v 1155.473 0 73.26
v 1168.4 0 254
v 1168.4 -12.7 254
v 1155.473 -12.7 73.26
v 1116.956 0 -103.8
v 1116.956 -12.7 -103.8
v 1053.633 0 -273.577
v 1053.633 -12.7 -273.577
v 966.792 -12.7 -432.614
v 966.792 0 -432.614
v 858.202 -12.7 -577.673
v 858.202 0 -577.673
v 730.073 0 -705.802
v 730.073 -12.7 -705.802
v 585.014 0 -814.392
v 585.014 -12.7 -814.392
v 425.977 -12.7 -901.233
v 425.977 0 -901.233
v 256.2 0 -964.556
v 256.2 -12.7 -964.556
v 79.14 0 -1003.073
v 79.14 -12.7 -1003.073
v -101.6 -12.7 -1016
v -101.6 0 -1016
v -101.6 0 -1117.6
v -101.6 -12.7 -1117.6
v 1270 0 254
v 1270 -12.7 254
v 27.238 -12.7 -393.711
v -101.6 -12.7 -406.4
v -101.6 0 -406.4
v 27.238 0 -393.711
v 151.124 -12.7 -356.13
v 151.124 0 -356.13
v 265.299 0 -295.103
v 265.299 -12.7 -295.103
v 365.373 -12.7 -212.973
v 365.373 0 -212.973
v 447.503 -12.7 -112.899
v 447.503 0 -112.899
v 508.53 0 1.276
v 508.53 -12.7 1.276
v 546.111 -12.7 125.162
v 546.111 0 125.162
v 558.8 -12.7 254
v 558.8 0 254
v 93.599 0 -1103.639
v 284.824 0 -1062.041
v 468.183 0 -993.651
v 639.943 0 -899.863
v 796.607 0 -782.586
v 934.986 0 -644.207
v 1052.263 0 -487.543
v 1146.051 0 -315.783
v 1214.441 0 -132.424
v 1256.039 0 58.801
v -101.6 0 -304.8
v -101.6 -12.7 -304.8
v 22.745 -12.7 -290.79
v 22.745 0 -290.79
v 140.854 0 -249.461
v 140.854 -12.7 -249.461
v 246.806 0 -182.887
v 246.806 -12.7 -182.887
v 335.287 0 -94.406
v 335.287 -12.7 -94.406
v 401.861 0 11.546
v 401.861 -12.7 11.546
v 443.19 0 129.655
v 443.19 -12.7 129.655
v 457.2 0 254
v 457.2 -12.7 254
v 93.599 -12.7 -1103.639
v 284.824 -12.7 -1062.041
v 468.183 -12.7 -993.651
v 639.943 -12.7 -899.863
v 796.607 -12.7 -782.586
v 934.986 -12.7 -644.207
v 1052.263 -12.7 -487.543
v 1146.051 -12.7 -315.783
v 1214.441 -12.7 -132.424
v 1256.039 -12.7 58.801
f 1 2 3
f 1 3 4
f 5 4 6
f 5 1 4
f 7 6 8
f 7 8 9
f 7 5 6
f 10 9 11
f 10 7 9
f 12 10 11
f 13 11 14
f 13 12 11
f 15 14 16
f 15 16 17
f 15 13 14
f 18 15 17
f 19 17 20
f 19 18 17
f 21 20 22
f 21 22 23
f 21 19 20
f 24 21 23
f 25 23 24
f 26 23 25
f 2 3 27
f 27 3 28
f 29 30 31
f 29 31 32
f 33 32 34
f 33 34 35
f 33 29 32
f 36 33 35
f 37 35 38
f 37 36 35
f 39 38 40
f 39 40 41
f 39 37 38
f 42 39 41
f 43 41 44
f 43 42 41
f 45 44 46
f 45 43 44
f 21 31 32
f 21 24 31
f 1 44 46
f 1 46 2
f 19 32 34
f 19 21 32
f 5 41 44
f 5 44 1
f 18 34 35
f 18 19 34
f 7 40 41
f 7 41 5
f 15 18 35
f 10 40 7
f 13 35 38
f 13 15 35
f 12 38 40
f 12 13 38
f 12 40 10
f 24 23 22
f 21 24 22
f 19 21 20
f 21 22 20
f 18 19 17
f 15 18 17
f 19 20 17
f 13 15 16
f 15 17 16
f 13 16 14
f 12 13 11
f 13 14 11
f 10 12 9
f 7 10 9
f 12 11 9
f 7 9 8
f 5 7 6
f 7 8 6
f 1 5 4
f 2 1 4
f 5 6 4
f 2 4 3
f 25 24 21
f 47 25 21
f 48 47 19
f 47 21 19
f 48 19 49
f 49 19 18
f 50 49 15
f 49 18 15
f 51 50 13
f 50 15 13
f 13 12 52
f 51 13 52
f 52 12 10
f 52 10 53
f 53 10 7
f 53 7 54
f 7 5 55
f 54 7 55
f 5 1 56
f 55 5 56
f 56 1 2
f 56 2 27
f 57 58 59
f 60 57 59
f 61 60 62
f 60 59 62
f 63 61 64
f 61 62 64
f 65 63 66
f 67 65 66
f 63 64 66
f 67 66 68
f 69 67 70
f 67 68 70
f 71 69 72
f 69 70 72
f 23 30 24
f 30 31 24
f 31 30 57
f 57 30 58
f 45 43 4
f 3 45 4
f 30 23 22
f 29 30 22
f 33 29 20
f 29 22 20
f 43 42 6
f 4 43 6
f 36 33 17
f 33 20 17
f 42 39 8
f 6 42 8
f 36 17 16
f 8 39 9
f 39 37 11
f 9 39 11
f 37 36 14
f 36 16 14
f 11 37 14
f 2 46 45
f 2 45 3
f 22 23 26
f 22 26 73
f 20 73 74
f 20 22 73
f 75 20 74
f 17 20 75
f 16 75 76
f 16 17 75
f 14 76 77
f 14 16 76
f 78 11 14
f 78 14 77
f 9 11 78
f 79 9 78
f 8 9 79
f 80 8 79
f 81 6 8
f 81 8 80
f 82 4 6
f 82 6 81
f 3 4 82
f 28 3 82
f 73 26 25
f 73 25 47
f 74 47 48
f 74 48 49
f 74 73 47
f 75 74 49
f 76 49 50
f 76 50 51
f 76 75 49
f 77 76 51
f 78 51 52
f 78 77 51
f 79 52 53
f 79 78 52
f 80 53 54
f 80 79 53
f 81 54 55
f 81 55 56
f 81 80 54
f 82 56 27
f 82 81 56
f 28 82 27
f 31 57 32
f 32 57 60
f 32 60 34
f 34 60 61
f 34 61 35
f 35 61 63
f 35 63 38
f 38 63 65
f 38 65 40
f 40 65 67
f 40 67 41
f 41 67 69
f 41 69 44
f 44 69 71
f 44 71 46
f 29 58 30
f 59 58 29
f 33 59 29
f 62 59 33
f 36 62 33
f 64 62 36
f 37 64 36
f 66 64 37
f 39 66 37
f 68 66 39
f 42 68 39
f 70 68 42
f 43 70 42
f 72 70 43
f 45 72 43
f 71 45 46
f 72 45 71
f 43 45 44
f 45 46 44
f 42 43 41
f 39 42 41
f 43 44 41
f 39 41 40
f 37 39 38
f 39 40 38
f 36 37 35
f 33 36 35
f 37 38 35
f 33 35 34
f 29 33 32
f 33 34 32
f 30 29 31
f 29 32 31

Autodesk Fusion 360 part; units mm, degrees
sketch "Sketch1" plane through (0, 0, 0) normal (0, 0, 1) x (1, 0, 0)
sketch "Sketch2" plane through (0, 0, 0) normal (0, 1, 0) x (1, 0, 0)
  circle A0 centre (-101.6, -254) radius 660.4
  circle A1 centre (-101.6, -254) radius 1270
  line L0 (-101.6, -254) -> (-101.6, -1524)
  line L1 (-101.6, -254) -> (1168.4, -254)
  line L2 (-101.6, -254) -> (-101.6, 1016)
  dimension "d1" = 1320.8
  dimension "d2" = 609.6
extrude "Extrude1" add sketch "Sketch2" against normal blind 12.7 contours A0 A1 L1 L2 makes body 1
sketch "Sketch3" plane through (0, -12.7, 0) normal (0, -1, 0) x (1, 0, 0)
  arc A0 (-101.6, -1016) -> (1168.4, 254) centre (-101.6, 254) ccw
  line L0 (1168.4, 254) -> (558.8, 254)
  arc A1 (-101.6, -406.4) -> (558.8, 254) centre (-101.6, 254) ccw
  line L1 (-101.6, -406.4) -> (-101.6, -1016)
  line L2 (1266.2319, 355.6) -> (447.886, 355.6)
  arc A2 (-203.2, -295.486) -> (447.886, 355.6) centre (-101.6, 254) ccw
  line L3 (-203.2, -295.486) -> (-203.2, -1113.8319)
  arc A3 (-203.2, -1113.8319) -> (1266.2319, 355.6) centre (-101.6, 254) ccw
  line L4 (-101.6, -1016) -> (-101.6, -1117.6)
  line L5 (-101.6, -406.4) -> (-101.6, -304.8)
  line L6 (558.8, 254) -> (457.2, 254)
  line L7 (1168.4, 254) -> (1270, 254)
  dimension "d5" = -101.6
extrude "Extrude1'" add sketch "Sketch3" against normal blind 12.7 separate body contours A0 A3 L4 L7 | A1 A2 L5 L6 makes body 2 at (-70.2718, -12.7, -370.2927) makes body 3 at (1195.8119, -12.7, -59.1413) in component "Turn"
copy_body "CutPasteBodies1" bodies 1 removing the originals makes body 4 in component "Turn"
component "Turn" placed x (1, 0, 0) y (0, 1, 0) z (0, 0, 1) at (0, 0, 0)
